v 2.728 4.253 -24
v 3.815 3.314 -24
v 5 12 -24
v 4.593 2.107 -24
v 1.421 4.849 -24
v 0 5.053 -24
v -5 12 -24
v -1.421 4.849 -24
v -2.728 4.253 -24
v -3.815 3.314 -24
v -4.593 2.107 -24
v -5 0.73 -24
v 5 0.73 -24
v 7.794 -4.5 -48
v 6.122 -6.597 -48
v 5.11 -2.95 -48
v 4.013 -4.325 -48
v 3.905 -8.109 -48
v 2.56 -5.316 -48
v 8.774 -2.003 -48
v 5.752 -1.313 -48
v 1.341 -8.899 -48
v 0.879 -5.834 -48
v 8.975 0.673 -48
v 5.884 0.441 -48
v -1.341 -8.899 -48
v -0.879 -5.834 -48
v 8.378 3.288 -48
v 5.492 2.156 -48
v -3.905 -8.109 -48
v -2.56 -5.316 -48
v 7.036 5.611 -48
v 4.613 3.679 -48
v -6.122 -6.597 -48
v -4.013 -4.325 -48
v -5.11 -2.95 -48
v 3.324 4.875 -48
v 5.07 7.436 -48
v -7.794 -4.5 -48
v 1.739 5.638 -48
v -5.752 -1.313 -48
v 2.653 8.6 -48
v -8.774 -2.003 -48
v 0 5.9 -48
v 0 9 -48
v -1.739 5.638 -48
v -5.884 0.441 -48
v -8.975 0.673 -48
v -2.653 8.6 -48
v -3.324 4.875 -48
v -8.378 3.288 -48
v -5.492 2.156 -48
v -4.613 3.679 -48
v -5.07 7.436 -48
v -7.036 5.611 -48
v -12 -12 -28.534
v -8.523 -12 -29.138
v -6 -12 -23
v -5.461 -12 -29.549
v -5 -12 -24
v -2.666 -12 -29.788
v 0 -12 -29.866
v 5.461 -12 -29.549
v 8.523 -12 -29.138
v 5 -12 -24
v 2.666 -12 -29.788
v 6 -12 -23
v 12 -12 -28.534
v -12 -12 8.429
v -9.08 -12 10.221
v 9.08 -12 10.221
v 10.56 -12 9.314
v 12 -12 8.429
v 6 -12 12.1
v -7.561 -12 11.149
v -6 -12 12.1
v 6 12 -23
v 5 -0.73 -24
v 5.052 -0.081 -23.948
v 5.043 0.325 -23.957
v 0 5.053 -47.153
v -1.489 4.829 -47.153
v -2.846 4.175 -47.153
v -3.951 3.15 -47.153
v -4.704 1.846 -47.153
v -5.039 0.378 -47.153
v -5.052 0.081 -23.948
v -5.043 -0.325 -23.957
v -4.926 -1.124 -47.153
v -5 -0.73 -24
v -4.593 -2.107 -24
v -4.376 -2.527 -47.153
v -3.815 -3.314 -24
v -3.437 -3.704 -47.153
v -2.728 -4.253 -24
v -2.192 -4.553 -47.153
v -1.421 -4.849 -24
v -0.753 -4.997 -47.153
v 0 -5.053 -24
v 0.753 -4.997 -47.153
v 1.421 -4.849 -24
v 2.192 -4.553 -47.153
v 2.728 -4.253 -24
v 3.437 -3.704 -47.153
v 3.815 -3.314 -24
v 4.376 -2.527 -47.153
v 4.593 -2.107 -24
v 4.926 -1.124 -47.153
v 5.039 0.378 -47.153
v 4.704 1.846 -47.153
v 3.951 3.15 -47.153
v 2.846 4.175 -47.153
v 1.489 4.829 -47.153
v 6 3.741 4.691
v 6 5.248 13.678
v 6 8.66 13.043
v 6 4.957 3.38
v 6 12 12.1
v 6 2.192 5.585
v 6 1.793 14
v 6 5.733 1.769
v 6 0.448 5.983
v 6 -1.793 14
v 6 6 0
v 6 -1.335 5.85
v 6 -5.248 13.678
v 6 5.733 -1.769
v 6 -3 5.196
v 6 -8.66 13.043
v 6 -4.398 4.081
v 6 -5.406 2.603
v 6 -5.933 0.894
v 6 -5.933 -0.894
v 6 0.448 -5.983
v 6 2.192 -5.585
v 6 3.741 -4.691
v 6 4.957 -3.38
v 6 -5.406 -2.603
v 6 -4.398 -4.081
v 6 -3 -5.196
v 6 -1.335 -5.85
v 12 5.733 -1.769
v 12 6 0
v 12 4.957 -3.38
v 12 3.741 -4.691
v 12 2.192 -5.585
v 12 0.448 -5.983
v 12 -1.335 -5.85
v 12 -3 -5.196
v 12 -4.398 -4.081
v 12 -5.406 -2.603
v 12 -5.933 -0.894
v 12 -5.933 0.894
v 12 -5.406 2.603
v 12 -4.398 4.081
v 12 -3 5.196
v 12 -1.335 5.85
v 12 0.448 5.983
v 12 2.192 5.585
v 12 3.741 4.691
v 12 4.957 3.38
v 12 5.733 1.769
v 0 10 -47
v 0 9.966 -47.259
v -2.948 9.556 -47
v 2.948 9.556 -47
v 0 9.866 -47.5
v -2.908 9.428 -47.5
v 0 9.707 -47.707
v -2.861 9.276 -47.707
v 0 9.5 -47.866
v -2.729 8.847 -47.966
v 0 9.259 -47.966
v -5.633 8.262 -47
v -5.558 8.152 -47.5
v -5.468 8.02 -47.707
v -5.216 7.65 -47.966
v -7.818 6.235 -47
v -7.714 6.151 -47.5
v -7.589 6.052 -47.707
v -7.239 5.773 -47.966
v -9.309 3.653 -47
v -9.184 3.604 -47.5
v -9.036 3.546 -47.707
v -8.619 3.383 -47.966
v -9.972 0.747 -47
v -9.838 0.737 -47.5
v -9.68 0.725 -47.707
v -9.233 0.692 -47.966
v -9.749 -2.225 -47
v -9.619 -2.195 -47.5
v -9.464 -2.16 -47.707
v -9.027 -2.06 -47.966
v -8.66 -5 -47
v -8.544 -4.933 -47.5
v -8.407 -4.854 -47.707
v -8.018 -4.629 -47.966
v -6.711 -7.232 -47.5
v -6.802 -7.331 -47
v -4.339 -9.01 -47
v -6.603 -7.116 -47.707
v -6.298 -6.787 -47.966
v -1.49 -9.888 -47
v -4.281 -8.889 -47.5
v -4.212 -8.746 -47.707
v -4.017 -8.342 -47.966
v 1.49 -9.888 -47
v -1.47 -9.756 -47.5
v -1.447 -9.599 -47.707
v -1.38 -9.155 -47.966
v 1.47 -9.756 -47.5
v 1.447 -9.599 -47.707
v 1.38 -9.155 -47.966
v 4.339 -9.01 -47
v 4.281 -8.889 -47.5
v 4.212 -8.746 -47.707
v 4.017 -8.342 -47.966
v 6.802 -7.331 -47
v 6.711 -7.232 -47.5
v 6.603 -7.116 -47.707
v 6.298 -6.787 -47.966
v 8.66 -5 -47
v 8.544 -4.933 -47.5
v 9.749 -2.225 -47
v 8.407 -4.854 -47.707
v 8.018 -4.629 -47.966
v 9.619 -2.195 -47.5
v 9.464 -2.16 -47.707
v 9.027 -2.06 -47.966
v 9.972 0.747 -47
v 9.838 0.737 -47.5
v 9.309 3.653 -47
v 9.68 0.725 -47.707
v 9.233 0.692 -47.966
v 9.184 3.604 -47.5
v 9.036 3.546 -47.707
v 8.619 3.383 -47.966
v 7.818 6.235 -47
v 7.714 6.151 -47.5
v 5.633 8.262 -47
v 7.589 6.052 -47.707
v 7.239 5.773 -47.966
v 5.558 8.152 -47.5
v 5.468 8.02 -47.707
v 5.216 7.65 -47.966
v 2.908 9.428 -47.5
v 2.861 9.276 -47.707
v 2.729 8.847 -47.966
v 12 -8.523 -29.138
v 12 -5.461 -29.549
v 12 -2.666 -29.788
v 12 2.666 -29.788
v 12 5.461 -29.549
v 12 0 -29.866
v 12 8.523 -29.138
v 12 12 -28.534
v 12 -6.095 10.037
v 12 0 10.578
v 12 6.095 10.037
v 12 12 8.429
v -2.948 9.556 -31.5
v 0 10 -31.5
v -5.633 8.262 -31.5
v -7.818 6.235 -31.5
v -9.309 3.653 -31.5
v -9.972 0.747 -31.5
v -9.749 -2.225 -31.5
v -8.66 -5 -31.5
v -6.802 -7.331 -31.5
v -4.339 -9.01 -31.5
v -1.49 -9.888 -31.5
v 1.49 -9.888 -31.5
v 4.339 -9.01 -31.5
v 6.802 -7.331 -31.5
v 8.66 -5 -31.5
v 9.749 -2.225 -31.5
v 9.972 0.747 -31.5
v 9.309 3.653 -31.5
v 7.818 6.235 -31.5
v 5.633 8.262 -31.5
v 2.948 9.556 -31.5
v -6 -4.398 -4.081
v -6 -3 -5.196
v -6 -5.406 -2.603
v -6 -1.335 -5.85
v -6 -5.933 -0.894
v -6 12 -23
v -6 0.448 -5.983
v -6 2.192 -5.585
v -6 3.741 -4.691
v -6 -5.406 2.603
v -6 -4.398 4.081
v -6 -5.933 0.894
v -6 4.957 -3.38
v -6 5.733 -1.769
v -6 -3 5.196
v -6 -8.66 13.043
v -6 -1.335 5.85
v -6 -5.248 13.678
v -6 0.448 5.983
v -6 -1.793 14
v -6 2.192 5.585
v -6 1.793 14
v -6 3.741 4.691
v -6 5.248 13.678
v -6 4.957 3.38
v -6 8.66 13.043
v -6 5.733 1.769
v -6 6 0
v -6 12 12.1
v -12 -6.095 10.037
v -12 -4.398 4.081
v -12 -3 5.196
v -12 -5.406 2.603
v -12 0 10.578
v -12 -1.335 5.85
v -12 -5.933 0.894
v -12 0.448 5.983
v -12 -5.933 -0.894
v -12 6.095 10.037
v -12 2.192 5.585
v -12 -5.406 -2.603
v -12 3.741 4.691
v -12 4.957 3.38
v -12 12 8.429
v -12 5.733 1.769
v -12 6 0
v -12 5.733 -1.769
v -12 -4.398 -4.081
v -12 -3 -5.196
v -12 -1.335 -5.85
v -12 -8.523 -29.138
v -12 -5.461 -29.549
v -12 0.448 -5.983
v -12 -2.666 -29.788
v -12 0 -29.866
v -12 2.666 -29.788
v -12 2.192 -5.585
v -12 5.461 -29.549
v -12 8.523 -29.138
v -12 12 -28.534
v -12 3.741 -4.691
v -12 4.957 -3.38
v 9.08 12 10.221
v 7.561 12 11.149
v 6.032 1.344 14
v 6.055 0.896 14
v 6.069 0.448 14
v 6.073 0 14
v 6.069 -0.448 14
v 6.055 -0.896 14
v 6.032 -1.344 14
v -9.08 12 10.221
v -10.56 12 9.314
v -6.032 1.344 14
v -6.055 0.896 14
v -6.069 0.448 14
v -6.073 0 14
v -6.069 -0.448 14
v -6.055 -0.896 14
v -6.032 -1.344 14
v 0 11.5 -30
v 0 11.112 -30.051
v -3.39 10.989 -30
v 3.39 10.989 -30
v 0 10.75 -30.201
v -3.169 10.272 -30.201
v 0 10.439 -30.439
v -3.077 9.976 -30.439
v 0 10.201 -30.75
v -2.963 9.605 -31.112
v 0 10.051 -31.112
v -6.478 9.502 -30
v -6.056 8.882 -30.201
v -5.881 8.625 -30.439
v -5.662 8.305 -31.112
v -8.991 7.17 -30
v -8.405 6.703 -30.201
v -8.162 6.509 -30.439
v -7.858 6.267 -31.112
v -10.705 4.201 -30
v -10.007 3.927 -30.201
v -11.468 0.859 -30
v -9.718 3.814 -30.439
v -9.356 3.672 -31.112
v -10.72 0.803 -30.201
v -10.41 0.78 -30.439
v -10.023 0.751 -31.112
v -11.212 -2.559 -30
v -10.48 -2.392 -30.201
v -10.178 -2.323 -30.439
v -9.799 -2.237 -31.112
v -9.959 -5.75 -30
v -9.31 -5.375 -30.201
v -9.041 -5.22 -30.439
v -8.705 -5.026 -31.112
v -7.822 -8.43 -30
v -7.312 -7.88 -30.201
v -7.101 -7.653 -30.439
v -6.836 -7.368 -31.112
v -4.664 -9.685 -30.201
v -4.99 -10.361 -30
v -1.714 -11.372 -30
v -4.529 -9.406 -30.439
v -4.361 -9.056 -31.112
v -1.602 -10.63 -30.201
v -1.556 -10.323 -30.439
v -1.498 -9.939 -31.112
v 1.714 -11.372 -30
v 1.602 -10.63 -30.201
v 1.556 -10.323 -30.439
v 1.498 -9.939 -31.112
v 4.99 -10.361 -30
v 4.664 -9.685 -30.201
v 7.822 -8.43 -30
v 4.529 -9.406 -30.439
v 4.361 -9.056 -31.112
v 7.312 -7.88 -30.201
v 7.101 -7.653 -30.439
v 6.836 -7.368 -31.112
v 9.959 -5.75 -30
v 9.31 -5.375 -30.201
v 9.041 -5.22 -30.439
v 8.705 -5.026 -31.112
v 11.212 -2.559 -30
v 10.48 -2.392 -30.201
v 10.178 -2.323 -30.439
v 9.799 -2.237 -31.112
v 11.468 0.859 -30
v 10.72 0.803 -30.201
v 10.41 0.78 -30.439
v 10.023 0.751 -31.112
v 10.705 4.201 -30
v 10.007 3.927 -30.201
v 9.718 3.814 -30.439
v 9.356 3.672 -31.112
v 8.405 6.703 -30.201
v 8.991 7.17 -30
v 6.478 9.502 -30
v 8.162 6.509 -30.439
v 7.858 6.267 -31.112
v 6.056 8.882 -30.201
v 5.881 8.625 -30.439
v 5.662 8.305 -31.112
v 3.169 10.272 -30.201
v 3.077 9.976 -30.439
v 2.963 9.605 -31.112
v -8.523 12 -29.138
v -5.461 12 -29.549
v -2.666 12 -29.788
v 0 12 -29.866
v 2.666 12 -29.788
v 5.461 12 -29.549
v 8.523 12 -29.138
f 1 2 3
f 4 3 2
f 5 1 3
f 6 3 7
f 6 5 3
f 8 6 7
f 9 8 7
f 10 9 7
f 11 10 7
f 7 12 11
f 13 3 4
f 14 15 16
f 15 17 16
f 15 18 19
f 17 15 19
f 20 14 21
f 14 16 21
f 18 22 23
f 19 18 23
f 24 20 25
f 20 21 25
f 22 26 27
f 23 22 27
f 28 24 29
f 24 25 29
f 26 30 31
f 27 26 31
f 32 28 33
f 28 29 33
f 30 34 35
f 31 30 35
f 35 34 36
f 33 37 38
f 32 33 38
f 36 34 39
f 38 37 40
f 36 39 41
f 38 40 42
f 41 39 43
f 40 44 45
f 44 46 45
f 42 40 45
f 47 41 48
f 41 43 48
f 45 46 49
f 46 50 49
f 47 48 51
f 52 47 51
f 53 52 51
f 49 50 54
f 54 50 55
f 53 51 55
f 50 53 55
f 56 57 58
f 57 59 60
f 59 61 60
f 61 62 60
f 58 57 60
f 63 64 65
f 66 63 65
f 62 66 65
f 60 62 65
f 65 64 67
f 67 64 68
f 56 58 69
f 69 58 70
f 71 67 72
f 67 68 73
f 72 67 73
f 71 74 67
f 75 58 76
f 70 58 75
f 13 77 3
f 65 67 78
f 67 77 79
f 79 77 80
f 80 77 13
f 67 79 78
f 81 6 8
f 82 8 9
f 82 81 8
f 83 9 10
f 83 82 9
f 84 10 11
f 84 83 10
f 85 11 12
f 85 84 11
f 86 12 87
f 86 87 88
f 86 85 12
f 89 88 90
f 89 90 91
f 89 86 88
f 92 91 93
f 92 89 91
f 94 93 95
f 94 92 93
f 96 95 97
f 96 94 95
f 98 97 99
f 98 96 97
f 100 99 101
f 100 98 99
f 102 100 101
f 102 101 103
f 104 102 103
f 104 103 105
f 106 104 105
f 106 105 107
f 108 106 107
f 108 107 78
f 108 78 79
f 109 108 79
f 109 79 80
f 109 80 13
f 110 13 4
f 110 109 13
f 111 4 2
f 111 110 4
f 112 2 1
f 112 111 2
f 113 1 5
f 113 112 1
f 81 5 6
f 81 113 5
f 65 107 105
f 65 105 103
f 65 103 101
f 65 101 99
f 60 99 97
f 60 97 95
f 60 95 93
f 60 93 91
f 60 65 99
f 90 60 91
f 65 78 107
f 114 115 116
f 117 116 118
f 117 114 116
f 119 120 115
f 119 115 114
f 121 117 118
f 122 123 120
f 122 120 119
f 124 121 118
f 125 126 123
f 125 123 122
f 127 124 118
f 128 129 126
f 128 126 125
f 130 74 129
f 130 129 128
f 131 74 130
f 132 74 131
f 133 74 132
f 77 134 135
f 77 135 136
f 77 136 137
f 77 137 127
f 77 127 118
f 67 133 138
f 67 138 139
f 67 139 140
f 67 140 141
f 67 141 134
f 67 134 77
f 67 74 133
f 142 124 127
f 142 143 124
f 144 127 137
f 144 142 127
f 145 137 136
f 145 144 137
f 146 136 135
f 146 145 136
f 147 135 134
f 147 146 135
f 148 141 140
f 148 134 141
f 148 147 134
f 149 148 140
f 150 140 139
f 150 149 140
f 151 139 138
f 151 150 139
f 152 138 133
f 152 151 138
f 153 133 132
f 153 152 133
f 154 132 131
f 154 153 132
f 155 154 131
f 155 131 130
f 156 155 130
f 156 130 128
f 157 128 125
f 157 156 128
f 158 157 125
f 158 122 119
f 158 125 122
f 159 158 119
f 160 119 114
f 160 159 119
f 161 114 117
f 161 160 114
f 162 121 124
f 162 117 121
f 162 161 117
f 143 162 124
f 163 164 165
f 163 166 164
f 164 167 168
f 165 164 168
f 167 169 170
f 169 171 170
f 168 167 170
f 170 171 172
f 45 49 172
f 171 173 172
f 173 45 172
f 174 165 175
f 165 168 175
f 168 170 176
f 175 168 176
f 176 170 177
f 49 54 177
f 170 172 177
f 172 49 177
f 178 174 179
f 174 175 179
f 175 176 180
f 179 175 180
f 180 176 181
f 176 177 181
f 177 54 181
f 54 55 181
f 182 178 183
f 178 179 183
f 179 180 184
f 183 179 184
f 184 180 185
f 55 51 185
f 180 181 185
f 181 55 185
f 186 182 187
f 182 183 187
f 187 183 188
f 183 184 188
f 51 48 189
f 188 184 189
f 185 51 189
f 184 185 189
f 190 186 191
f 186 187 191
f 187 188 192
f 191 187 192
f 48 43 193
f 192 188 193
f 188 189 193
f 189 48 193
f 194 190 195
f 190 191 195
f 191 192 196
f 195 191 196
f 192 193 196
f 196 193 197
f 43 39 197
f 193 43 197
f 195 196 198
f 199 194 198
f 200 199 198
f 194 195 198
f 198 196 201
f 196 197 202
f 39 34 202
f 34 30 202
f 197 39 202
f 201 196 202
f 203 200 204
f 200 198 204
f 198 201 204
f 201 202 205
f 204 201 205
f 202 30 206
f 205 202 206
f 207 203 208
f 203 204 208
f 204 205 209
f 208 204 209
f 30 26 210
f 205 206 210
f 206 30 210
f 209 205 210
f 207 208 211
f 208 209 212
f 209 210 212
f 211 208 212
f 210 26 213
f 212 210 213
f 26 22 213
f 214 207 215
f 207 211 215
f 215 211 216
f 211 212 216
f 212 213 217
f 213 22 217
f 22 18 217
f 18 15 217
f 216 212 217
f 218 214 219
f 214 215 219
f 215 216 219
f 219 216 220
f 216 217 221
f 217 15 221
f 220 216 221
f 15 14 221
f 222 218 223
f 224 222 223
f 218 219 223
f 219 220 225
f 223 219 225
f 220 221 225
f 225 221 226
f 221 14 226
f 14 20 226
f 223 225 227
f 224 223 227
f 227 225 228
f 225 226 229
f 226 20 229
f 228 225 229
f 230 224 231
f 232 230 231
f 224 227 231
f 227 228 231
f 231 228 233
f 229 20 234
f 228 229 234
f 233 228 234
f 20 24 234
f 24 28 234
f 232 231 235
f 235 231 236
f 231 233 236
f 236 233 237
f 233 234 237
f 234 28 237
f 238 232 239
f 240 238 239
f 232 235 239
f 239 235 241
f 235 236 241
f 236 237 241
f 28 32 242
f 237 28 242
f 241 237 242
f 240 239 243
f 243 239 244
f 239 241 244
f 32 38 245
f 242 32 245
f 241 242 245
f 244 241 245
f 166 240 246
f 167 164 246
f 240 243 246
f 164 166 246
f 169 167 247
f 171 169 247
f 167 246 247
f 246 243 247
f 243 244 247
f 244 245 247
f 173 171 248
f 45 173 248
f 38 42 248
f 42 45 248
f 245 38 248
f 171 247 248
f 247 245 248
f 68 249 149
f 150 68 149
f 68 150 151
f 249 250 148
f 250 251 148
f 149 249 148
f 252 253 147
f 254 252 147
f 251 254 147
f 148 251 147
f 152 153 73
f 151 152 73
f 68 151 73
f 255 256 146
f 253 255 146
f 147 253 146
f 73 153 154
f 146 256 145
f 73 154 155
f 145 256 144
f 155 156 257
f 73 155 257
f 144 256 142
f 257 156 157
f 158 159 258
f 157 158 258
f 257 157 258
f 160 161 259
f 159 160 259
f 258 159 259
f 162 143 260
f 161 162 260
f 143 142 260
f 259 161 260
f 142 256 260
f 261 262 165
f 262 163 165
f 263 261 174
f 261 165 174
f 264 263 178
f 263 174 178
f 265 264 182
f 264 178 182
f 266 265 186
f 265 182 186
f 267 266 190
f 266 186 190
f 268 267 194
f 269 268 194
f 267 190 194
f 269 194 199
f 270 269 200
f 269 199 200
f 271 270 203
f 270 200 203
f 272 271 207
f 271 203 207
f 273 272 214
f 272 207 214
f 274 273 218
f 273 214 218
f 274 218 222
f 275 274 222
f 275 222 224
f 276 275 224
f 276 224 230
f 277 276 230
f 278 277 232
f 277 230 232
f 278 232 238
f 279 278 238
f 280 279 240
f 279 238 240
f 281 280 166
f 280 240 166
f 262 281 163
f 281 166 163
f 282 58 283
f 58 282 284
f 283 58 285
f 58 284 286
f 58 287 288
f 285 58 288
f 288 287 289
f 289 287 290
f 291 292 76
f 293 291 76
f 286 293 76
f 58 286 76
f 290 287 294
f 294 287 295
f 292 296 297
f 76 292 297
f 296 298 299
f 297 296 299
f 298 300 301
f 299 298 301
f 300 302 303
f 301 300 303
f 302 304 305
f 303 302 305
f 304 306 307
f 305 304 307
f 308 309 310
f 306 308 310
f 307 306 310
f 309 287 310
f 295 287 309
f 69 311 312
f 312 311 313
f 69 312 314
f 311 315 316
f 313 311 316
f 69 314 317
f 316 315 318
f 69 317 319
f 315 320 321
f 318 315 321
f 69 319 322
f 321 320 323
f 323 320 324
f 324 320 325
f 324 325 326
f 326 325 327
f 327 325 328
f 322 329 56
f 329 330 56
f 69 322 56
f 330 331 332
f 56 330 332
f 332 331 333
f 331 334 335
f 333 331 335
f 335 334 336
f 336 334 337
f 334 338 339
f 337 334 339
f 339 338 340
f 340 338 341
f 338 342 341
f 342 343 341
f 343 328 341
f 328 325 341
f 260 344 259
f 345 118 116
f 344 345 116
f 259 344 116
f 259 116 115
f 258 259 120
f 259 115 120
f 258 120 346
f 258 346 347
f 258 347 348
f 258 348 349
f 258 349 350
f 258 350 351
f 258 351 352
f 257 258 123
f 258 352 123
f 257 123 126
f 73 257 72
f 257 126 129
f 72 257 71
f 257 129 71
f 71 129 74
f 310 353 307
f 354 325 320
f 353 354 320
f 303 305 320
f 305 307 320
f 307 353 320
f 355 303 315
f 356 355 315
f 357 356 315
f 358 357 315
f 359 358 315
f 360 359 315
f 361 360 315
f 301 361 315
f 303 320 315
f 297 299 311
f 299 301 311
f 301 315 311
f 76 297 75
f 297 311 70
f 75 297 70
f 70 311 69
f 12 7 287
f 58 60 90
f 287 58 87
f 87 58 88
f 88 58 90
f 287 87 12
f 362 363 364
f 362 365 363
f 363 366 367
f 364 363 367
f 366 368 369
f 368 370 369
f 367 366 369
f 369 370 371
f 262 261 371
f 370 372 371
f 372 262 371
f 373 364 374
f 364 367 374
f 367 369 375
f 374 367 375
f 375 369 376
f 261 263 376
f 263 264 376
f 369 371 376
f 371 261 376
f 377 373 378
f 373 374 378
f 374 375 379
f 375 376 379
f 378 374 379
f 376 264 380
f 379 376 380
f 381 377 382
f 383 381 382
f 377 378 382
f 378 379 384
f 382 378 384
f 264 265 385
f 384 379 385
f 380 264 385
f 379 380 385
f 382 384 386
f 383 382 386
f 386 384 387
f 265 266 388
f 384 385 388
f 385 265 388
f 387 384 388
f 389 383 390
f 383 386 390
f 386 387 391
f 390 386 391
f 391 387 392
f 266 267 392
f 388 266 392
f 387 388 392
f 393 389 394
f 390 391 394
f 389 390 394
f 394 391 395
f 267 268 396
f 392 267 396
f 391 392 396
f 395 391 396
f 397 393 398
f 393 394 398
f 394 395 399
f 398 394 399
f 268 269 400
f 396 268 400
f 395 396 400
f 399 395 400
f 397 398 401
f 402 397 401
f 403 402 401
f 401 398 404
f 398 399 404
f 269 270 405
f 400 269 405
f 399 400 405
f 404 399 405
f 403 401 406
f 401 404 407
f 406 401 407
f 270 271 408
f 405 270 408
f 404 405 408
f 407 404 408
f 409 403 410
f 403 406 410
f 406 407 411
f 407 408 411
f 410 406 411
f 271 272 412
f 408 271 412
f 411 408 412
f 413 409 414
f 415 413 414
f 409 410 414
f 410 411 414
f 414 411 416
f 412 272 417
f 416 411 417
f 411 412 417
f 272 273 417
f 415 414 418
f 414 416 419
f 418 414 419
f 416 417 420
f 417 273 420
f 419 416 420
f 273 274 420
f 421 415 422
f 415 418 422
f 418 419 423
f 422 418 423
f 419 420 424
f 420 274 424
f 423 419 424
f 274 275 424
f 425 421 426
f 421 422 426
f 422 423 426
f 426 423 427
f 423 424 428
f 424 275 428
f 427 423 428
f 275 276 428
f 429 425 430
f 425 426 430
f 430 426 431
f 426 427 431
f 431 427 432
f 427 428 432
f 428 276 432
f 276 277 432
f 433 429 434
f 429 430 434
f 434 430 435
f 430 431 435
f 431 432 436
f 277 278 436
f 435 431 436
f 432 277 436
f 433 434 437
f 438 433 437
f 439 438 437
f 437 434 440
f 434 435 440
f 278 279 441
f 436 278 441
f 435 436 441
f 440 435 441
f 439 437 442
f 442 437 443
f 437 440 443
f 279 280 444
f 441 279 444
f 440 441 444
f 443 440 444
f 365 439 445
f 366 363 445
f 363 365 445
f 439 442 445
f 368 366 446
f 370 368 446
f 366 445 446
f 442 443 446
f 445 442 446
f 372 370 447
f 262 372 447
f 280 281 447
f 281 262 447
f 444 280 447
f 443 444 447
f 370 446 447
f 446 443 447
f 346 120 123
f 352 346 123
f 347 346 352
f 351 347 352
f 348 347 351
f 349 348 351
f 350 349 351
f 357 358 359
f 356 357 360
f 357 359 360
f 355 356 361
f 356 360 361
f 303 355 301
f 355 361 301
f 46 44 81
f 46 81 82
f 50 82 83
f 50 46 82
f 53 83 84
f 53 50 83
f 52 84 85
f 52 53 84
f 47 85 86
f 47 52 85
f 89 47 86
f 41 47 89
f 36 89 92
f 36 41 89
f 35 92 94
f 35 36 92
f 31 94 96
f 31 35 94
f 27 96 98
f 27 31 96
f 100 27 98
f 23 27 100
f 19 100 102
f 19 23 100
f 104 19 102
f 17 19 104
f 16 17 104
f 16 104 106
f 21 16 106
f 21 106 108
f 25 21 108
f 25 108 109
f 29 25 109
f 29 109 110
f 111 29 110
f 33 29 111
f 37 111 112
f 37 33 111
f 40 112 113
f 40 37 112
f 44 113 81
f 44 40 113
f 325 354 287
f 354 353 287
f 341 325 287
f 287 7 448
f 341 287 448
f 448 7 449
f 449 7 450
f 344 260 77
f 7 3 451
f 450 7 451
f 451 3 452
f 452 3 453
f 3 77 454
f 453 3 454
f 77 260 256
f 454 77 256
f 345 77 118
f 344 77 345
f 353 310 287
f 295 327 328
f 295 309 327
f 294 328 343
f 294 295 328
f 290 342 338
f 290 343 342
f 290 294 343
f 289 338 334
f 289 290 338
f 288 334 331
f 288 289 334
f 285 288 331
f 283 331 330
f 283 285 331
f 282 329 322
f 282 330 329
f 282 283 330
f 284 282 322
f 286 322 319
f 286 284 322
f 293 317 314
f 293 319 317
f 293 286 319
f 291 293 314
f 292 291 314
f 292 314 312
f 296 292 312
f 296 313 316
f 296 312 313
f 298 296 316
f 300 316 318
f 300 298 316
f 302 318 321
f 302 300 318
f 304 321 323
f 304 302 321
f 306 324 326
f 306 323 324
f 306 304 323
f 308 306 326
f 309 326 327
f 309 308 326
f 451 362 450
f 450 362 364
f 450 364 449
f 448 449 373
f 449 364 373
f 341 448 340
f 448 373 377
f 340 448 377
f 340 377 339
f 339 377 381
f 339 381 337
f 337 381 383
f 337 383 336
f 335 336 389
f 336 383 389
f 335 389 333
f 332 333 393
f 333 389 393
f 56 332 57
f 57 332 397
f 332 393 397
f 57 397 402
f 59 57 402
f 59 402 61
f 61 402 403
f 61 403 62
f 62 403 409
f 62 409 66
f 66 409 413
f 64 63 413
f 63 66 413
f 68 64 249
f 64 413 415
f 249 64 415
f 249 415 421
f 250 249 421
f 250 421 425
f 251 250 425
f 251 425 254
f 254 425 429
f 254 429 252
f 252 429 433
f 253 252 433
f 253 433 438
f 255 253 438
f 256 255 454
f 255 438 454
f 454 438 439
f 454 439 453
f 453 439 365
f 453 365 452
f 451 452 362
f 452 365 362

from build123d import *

# Parameters (mm, degrees)
CUT_EXTRUDE1_DEPTH           = 25
CUT_EXTRUDE1_DEPTH_BACK      = 25
CUT_EXTRUDE2_DEPTH           = 25
CUT_EXTRUDE2_DEPTH_BACK      = 25
CUT_EXTRUDE3_DEPTH           = 25
CUT_EXTRUDE3_DEPTH_BACK      = 25
SKETCH5_W                    = 31.1
SKETCH5_H                    = 6
CUT_REVOLVE3_ANGLE           = 90
CUT_REVOLVE3_OTHER_WAY_ANGLE = 90


with BuildPart() as part:
    # Sketch1 → Revolve1 (revolve)
    with BuildSketch(Plane(origin=(0, 0, 0), x_dir=(0, 0, -1), z_dir=(1, 0, 0))):
        with BuildLine():
            Line((-14, 0), (-14, 24))
            Line((-14, 24), (26.650635095, 24))
            Line((26.650635095, 24), (30, 11.5))
            ThreePointArc((30, 11.5), (30.439339828, 10.439339828), (31.5, 10))
            Line((31.5, 10), (47, 10))
            ThreePointArc((47, 10), (47.707106781, 9.707106781), (48, 9))
            Line((48, 9), (48, 0))
            Line((48, 0), (-14, 0))
        make_face()
    revolve(axis=Axis((0, 0, -48), (0, 0, 1)))

    # Sketch2 → Cut-Extrude1 (cut, two sides: drawn at the far end of the back side and taken through both)
    with BuildSketch(Plane(origin=(0, 0, 0), x_dir=(1, 0, 0), z_dir=(0, 1, 0)).offset(-CUT_EXTRUDE1_DEPTH_BACK)):
        Polygon((-6, 23), (-6, -15), (6, -15), (6, 23), (5, 24), (-5, 24), align=None)
    extrude(amount=CUT_EXTRUDE1_DEPTH + CUT_EXTRUDE1_DEPTH_BACK, mode=Mode.SUBTRACT)

    # Sketch3 → Cut-Extrude2 (cut, two sides: drawn at the far end of the back side and taken through both)
    with BuildSketch(Plane(origin=(0, 0, 0), x_dir=(0, 0, -1), z_dir=(1, 0, 0)).offset(-CUT_EXTRUDE2_DEPTH_BACK)):
        Polygon((-39, -36), (48, -36), (48, -12), (-15, -12), (-15, 12), (48, 12), (48, 36), (-39, 36), align=None)
    extrude(amount=CUT_EXTRUDE2_DEPTH + CUT_EXTRUDE2_DEPTH_BACK, mode=Mode.SUBTRACT)

    # Sketch4 → Cut-Extrude3 (cut, two sides: drawn at the far end of the back side and taken through both)
    with BuildSketch(Plane(origin=(0, 0, 0), x_dir=(1, 0, 0), z_dir=(0, 1, 0)).offset(-CUT_EXTRUDE3_DEPTH_BACK)):
        Polygon((-36, -39), (36, -39), (36, 48), (12, 48), (12, -15), (-12, -15), (-12, 48), (-36, 48), align=None)
    extrude(amount=CUT_EXTRUDE3_DEPTH + CUT_EXTRUDE3_DEPTH_BACK, mode=Mode.SUBTRACT)

    # Sketch5 → Cut-Revolve1 (revolve, cut)
    with BuildSketch(Plane.XY):
        with Locations((0, 3)):
            Rectangle(SKETCH5_W, SKETCH5_H)
    revolve(axis=Axis((15.55, 0, 0), (-1, 0, 0)), mode=Mode.SUBTRACT)

    # Sketch6 → Cut-Revolve2 (revolve, cut)
    with BuildSketch(Plane(origin=(0, 0, 0), x_dir=(0, 0, -1), z_dir=(1, 0, 0))):
        Polygon((22.9, 0), (22.9, 5.053), (47.153, 5.053), (48.1, 6), (48.1, 0), align=None)
    revolve(axis=Axis((0, 0, -48.1), (0, 0, 1)), mode=Mode.SUBTRACT)

    # Sketch7 → Cut-Revolve3 (revolve, cut)
    with BuildSketch(Plane(origin=(0, 0, 0), x_dir=(1, 0, 0), z_dir=(0, 1, 0))):
        Polygon((-14, -9.42346282), (-14, -37.136275741), (0, -45.219179509), (14, -37.136275741), (14, -9.42346282), (0, -17.506366588), align=None)
    revolve(axis=Axis((-14, 0, -24), (-1, 0, 0)), revolution_arc=CUT_REVOLVE3_ANGLE, mode=Mode.SUBTRACT)

    # Sketch7 → Cut-Revolve3 other way (revolve, cut)
    with BuildSketch(Plane(origin=(0, 0, 0), x_dir=(1, 0, 0), z_dir=(0, 1, 0))):
        Polygon((-14, -9.42346282), (-14, -37.136275741), (0, -45.219179509), (14, -37.136275741), (14, -9.42346282), (0, -17.506366588), align=None)
    revolve(axis=Axis((-14, 0, -24), (1, 0, 0)), revolution_arc=CUT_REVOLVE3_OTHER_WAY_ANGLE, mode=Mode.SUBTRACT)


solid = part.part
